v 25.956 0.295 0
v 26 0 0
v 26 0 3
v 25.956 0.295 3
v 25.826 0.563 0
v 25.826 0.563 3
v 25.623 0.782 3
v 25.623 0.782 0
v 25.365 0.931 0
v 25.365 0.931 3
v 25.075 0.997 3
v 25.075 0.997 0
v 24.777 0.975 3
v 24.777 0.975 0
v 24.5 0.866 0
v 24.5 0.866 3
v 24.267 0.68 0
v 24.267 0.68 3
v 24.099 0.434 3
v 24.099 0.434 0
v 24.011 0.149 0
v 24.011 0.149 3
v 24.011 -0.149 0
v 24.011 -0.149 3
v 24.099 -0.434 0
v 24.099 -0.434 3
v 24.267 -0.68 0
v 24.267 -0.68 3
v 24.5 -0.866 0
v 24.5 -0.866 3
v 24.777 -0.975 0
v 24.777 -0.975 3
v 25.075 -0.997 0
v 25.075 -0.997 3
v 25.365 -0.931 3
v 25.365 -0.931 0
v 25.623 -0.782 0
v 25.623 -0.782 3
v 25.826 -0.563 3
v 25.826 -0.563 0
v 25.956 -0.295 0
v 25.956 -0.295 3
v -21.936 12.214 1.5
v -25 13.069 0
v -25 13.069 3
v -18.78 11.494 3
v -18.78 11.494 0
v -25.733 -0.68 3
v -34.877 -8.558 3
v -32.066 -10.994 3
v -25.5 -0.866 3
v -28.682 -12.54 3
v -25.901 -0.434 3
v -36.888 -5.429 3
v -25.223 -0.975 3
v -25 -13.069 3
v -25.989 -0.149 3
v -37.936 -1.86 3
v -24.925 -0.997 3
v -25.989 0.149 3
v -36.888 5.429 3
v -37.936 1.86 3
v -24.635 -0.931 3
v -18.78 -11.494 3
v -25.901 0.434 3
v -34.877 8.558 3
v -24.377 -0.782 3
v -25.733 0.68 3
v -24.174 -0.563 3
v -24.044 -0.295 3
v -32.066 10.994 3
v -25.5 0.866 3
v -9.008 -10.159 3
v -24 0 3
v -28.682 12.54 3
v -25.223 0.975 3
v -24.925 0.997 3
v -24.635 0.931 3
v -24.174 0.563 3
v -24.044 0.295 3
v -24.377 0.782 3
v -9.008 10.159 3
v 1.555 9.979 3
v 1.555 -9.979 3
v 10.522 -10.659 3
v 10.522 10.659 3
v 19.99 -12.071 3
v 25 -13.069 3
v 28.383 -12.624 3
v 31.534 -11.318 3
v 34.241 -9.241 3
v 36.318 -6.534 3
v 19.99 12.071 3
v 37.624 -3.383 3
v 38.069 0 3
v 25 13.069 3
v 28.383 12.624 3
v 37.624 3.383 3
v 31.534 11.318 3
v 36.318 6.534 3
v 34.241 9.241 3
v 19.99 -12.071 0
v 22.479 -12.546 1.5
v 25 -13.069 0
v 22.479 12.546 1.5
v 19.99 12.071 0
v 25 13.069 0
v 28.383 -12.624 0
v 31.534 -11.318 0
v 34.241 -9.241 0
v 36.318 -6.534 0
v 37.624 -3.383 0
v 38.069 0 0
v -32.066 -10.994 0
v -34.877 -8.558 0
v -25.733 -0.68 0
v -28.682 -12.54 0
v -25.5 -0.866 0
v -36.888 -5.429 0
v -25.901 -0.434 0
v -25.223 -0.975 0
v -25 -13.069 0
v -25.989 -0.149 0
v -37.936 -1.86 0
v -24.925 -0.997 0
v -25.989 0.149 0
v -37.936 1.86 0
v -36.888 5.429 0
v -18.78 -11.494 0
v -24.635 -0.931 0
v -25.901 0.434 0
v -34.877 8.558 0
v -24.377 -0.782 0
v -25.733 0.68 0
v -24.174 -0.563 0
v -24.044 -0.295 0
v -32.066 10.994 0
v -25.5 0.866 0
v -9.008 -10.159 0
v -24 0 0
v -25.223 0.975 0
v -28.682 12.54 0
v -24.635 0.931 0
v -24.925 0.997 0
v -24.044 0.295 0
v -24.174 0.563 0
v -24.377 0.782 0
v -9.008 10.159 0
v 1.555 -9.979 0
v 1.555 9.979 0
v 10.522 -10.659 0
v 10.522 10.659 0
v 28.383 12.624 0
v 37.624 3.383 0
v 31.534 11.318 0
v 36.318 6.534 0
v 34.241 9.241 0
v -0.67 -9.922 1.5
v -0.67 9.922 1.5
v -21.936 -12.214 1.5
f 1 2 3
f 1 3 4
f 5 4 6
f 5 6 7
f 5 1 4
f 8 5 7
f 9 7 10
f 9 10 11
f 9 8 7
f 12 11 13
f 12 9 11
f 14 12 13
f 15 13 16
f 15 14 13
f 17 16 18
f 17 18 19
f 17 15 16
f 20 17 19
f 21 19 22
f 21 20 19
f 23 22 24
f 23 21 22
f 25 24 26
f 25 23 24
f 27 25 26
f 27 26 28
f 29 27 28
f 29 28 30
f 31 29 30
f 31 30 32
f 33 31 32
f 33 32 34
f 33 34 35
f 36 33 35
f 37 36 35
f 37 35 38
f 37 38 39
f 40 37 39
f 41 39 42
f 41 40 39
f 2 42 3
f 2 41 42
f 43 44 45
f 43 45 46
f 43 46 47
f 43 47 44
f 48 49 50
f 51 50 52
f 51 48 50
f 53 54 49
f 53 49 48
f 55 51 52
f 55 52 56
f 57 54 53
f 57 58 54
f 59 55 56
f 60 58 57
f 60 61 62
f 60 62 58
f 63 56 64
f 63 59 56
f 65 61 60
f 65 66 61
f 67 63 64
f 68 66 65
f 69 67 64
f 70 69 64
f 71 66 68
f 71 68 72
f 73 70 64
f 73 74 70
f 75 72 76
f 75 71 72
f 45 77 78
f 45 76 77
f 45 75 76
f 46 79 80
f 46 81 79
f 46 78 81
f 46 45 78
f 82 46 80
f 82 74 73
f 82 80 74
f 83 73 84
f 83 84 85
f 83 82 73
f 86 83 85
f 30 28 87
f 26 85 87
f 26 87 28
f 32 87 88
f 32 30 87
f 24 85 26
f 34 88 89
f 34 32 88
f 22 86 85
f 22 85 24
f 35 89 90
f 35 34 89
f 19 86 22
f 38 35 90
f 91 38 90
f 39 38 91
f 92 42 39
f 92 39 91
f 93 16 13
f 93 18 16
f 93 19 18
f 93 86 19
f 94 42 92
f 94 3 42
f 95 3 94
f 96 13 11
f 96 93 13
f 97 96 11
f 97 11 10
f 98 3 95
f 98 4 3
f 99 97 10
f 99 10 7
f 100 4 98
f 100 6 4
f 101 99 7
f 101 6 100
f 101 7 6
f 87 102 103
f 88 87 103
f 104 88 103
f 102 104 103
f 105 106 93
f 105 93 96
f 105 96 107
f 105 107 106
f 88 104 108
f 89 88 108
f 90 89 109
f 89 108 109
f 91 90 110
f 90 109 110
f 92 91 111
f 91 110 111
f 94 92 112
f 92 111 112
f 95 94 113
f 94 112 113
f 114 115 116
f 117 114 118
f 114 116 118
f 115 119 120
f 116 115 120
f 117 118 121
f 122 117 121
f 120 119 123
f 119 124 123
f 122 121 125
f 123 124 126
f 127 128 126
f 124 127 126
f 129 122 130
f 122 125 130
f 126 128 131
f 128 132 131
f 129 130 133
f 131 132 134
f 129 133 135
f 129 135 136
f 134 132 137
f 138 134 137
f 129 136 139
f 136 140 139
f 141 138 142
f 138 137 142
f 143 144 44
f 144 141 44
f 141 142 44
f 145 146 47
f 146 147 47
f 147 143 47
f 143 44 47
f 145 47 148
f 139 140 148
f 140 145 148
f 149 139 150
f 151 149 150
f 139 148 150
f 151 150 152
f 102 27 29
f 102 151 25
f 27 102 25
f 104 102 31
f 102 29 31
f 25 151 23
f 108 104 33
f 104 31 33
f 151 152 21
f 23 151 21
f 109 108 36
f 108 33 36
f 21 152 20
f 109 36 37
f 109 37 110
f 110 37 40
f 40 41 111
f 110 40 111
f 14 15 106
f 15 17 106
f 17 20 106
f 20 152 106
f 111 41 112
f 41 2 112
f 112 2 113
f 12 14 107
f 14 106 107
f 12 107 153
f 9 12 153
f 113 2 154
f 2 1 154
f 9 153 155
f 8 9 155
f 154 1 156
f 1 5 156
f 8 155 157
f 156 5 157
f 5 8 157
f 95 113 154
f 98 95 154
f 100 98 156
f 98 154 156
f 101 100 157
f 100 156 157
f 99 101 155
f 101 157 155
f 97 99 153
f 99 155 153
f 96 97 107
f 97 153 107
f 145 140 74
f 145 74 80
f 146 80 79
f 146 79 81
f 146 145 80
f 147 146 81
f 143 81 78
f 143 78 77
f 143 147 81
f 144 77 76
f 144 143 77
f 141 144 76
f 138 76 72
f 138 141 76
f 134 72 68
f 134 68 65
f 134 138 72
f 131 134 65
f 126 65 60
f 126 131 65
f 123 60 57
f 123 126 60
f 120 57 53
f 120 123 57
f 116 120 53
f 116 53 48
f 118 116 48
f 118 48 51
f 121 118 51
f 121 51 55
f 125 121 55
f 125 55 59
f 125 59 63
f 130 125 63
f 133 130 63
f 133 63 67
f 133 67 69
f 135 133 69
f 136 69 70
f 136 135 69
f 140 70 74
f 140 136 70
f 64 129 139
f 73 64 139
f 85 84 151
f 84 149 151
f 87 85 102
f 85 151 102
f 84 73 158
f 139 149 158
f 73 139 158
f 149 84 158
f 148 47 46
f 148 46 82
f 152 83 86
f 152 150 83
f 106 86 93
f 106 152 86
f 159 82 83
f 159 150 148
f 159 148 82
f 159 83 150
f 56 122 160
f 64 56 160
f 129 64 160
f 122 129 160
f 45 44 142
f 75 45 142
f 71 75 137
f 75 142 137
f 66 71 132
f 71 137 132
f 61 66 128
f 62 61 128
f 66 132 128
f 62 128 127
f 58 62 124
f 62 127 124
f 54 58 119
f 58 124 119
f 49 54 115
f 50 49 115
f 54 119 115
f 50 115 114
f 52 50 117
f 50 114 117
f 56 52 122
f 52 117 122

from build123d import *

# Parameters (mm, degrees)
SKETCH1_R           = 1
BOSS_EXTRUDE1_DEPTH = 3


with BuildPart() as part:
    # Sketch1 → Boss-Extrude1 (new body)
    # profile 1 of 6: a face of its own
    with BuildSketch(Plane.XY):
        with BuildLine():
            ThreePointArc((-24.781290204, -3.3929583), (-28.4, 0), (-24.781290204, 3.3929583))
            Line((-24.781290204, 3.3929583), (-12.188441083, 2.581224344))
            ThreePointArc((-12.188441083, 2.581224344), (-14.492522891, 7.771208774), (-18.780288742, 11.494083385))
            add(Edge.make_bspline(
                [(-25, 13.069), (-21.982355601, 12.146946089), (-18.780288742, 11.494083385)],
                knots=[0, 0, 0, 0.145973682, 0.145973682, 0.145973682], degree=2))
            ThreePointArc((-25, 13.069), (-38.069, 0), (-25, -13.069))
            add(Edge.make_bspline(
                [(-25, -13.069), (-21.982355601, -12.146946089), (-18.780288742, -11.494083385)],
                knots=[0, 0, 0, 0.145973682, 0.145973682, 0.145973682], degree=2))
            ThreePointArc((-18.780288742, -11.494083385), (-14.492522891, -7.771208774), (-12.188441083, -2.581224344))
            Line((-12.188441083, -2.581224344), (-24.781290204, -3.3929583))
        make_face()
    # profile 2 of 6: a face of its own
    with BuildSketch(Plane.XY):
        with BuildLine():
            ThreePointArc((-18.780288742, 11.494083385), (-14.492522891, 7.771208774), (-12.188441083, 2.581224344))
            Line((-12.188441083, 2.581224344), (-3.107347179, 1.995857823))
            ThreePointArc((-3.107347179, 1.995857823), (-1.236, 0), (-3.107347179, -1.995857823))
            Line((-3.107347179, -1.995857823), (-12.188441083, -2.581224344))
            ThreePointArc((-12.188441083, -2.581224344), (-14.492522891, -7.771208774), (-18.780288742, -11.494083385))
            add(Edge.make_bspline(
                [(-18.780288742, -11.494083385), (-1.944343038, -8.061437688), (19.989933944, -12.070542619)],
                knots=[0.145973682, 0.145973682, 0.145973682, 0.91347951, 0.91347951, 0.91347951], degree=2))
            ThreePointArc((19.989933944, -12.070542619), (14.904735293, -8.299662132), (12.188441083, -2.581224344))
            Line((12.188441083, -2.581224344), (3.107347179, -1.995857823))
            ThreePointArc((3.107347179, -1.995857823), (1.236, 0), (3.107347179, 1.995857823))
            Line((3.107347179, 1.995857823), (12.188441083, 2.581224344))
            ThreePointArc((12.188441083, 2.581224344), (14.904735293, 8.299662132), (19.989933944, 12.070542619))
            add(Edge.make_bspline(
                [(-18.780288742, 11.494083385), (-1.944343038, 8.061437688), (19.989933944, 12.070542619)],
                knots=[0.145973682, 0.145973682, 0.145973682, 0.91347951, 0.91347951, 0.91347951], degree=2))
        make_face()
    # profile 3 of 6: a face of its own
    with BuildSketch(Plane.XY):
        with BuildLine():
            add(Edge.make_bspline(
                [(19.989933944, 12.070542619), (22.462572371, 12.522486712), (25, 13.069)],
                knots=[0.91347951, 0.91347951, 0.91347951, 1, 1, 1], degree=2))
            ThreePointArc((19.989933944, 12.070542619), (14.904735293, 8.299662132), (12.188441083, 2.581224344))
            Line((12.188441083, 2.581224344), (24.781290204, 3.3929583))
            ThreePointArc((24.781290204, 3.3929583), (28.4, 0), (24.781290204, -3.3929583))
            Line((24.781290204, -3.3929583), (12.188441083, -2.581224344))
            ThreePointArc((12.188441083, -2.581224344), (14.904735293, -8.299662132), (19.989933944, -12.070542619))
            add(Edge.make_bspline(
                [(19.989933944, -12.070542619), (22.462572371, -12.522486712), (25, -13.069)],
                knots=[0.91347951, 0.91347951, 0.91347951, 1, 1, 1], degree=2))
            ThreePointArc((25, -13.069), (34.241178523, -9.241178523), (38.069, 0))
            ThreePointArc((38.069, 0), (34.241178523, 9.241178523), (25, 13.069))
        make_face()
    # profile 4 of 6: a face of its own
    with BuildSketch(Plane.XY):
        with BuildLine():
            Line((24.781290204, 3.3929583), (12.188441083, 2.581224344))
            ThreePointArc((12.188441083, 2.581224344), (11.931, 0), (12.188441083, -2.581224344))
            Line((12.188441083, -2.581224344), (24.781290204, -3.3929583))
            ThreePointArc((24.781290204, -3.3929583), (28.4, 0), (24.781290204, 3.3929583))
        make_face()
        with Locations((25, 0)):
            Circle(SKETCH1_R, mode=Mode.SUBTRACT)
    # profile 5 of 6: a face of its own
    with BuildSketch(Plane.XY):
        with BuildLine():
            ThreePointArc((12.188441083, -2.581224344), (11.931, 0), (12.188441083, 2.581224344))
            Line((12.188441083, 2.581224344), (3.107347179, 1.995857823))
            ThreePointArc((3.107347179, 1.995857823), (1.236, 0), (3.107347179, -1.995857823))
            Line((3.107347179, -1.995857823), (12.188441083, -2.581224344))
        make_face()
    # profile 6 of 6: a face of its own
    with BuildSketch(Plane.XY):
        with BuildLine():
            Line((-24.781290204, -3.3929583), (-3.107347179, -1.995857823))
            ThreePointArc((-3.107347179, -1.995857823), (-1.236, 0), (-3.107347179, 1.995857823))
            Line((-3.107347179, 1.995857823), (-24.781290204, 3.3929583))
            ThreePointArc((-24.781290204, 3.3929583), (-28.4, 0), (-24.781290204, -3.3929583))
        make_face()
        with Locations((-25, 0)):
            Circle(SKETCH1_R, mode=Mode.SUBTRACT)
    extrude(amount=BOSS_EXTRUDE1_DEPTH)


solid = part.part
